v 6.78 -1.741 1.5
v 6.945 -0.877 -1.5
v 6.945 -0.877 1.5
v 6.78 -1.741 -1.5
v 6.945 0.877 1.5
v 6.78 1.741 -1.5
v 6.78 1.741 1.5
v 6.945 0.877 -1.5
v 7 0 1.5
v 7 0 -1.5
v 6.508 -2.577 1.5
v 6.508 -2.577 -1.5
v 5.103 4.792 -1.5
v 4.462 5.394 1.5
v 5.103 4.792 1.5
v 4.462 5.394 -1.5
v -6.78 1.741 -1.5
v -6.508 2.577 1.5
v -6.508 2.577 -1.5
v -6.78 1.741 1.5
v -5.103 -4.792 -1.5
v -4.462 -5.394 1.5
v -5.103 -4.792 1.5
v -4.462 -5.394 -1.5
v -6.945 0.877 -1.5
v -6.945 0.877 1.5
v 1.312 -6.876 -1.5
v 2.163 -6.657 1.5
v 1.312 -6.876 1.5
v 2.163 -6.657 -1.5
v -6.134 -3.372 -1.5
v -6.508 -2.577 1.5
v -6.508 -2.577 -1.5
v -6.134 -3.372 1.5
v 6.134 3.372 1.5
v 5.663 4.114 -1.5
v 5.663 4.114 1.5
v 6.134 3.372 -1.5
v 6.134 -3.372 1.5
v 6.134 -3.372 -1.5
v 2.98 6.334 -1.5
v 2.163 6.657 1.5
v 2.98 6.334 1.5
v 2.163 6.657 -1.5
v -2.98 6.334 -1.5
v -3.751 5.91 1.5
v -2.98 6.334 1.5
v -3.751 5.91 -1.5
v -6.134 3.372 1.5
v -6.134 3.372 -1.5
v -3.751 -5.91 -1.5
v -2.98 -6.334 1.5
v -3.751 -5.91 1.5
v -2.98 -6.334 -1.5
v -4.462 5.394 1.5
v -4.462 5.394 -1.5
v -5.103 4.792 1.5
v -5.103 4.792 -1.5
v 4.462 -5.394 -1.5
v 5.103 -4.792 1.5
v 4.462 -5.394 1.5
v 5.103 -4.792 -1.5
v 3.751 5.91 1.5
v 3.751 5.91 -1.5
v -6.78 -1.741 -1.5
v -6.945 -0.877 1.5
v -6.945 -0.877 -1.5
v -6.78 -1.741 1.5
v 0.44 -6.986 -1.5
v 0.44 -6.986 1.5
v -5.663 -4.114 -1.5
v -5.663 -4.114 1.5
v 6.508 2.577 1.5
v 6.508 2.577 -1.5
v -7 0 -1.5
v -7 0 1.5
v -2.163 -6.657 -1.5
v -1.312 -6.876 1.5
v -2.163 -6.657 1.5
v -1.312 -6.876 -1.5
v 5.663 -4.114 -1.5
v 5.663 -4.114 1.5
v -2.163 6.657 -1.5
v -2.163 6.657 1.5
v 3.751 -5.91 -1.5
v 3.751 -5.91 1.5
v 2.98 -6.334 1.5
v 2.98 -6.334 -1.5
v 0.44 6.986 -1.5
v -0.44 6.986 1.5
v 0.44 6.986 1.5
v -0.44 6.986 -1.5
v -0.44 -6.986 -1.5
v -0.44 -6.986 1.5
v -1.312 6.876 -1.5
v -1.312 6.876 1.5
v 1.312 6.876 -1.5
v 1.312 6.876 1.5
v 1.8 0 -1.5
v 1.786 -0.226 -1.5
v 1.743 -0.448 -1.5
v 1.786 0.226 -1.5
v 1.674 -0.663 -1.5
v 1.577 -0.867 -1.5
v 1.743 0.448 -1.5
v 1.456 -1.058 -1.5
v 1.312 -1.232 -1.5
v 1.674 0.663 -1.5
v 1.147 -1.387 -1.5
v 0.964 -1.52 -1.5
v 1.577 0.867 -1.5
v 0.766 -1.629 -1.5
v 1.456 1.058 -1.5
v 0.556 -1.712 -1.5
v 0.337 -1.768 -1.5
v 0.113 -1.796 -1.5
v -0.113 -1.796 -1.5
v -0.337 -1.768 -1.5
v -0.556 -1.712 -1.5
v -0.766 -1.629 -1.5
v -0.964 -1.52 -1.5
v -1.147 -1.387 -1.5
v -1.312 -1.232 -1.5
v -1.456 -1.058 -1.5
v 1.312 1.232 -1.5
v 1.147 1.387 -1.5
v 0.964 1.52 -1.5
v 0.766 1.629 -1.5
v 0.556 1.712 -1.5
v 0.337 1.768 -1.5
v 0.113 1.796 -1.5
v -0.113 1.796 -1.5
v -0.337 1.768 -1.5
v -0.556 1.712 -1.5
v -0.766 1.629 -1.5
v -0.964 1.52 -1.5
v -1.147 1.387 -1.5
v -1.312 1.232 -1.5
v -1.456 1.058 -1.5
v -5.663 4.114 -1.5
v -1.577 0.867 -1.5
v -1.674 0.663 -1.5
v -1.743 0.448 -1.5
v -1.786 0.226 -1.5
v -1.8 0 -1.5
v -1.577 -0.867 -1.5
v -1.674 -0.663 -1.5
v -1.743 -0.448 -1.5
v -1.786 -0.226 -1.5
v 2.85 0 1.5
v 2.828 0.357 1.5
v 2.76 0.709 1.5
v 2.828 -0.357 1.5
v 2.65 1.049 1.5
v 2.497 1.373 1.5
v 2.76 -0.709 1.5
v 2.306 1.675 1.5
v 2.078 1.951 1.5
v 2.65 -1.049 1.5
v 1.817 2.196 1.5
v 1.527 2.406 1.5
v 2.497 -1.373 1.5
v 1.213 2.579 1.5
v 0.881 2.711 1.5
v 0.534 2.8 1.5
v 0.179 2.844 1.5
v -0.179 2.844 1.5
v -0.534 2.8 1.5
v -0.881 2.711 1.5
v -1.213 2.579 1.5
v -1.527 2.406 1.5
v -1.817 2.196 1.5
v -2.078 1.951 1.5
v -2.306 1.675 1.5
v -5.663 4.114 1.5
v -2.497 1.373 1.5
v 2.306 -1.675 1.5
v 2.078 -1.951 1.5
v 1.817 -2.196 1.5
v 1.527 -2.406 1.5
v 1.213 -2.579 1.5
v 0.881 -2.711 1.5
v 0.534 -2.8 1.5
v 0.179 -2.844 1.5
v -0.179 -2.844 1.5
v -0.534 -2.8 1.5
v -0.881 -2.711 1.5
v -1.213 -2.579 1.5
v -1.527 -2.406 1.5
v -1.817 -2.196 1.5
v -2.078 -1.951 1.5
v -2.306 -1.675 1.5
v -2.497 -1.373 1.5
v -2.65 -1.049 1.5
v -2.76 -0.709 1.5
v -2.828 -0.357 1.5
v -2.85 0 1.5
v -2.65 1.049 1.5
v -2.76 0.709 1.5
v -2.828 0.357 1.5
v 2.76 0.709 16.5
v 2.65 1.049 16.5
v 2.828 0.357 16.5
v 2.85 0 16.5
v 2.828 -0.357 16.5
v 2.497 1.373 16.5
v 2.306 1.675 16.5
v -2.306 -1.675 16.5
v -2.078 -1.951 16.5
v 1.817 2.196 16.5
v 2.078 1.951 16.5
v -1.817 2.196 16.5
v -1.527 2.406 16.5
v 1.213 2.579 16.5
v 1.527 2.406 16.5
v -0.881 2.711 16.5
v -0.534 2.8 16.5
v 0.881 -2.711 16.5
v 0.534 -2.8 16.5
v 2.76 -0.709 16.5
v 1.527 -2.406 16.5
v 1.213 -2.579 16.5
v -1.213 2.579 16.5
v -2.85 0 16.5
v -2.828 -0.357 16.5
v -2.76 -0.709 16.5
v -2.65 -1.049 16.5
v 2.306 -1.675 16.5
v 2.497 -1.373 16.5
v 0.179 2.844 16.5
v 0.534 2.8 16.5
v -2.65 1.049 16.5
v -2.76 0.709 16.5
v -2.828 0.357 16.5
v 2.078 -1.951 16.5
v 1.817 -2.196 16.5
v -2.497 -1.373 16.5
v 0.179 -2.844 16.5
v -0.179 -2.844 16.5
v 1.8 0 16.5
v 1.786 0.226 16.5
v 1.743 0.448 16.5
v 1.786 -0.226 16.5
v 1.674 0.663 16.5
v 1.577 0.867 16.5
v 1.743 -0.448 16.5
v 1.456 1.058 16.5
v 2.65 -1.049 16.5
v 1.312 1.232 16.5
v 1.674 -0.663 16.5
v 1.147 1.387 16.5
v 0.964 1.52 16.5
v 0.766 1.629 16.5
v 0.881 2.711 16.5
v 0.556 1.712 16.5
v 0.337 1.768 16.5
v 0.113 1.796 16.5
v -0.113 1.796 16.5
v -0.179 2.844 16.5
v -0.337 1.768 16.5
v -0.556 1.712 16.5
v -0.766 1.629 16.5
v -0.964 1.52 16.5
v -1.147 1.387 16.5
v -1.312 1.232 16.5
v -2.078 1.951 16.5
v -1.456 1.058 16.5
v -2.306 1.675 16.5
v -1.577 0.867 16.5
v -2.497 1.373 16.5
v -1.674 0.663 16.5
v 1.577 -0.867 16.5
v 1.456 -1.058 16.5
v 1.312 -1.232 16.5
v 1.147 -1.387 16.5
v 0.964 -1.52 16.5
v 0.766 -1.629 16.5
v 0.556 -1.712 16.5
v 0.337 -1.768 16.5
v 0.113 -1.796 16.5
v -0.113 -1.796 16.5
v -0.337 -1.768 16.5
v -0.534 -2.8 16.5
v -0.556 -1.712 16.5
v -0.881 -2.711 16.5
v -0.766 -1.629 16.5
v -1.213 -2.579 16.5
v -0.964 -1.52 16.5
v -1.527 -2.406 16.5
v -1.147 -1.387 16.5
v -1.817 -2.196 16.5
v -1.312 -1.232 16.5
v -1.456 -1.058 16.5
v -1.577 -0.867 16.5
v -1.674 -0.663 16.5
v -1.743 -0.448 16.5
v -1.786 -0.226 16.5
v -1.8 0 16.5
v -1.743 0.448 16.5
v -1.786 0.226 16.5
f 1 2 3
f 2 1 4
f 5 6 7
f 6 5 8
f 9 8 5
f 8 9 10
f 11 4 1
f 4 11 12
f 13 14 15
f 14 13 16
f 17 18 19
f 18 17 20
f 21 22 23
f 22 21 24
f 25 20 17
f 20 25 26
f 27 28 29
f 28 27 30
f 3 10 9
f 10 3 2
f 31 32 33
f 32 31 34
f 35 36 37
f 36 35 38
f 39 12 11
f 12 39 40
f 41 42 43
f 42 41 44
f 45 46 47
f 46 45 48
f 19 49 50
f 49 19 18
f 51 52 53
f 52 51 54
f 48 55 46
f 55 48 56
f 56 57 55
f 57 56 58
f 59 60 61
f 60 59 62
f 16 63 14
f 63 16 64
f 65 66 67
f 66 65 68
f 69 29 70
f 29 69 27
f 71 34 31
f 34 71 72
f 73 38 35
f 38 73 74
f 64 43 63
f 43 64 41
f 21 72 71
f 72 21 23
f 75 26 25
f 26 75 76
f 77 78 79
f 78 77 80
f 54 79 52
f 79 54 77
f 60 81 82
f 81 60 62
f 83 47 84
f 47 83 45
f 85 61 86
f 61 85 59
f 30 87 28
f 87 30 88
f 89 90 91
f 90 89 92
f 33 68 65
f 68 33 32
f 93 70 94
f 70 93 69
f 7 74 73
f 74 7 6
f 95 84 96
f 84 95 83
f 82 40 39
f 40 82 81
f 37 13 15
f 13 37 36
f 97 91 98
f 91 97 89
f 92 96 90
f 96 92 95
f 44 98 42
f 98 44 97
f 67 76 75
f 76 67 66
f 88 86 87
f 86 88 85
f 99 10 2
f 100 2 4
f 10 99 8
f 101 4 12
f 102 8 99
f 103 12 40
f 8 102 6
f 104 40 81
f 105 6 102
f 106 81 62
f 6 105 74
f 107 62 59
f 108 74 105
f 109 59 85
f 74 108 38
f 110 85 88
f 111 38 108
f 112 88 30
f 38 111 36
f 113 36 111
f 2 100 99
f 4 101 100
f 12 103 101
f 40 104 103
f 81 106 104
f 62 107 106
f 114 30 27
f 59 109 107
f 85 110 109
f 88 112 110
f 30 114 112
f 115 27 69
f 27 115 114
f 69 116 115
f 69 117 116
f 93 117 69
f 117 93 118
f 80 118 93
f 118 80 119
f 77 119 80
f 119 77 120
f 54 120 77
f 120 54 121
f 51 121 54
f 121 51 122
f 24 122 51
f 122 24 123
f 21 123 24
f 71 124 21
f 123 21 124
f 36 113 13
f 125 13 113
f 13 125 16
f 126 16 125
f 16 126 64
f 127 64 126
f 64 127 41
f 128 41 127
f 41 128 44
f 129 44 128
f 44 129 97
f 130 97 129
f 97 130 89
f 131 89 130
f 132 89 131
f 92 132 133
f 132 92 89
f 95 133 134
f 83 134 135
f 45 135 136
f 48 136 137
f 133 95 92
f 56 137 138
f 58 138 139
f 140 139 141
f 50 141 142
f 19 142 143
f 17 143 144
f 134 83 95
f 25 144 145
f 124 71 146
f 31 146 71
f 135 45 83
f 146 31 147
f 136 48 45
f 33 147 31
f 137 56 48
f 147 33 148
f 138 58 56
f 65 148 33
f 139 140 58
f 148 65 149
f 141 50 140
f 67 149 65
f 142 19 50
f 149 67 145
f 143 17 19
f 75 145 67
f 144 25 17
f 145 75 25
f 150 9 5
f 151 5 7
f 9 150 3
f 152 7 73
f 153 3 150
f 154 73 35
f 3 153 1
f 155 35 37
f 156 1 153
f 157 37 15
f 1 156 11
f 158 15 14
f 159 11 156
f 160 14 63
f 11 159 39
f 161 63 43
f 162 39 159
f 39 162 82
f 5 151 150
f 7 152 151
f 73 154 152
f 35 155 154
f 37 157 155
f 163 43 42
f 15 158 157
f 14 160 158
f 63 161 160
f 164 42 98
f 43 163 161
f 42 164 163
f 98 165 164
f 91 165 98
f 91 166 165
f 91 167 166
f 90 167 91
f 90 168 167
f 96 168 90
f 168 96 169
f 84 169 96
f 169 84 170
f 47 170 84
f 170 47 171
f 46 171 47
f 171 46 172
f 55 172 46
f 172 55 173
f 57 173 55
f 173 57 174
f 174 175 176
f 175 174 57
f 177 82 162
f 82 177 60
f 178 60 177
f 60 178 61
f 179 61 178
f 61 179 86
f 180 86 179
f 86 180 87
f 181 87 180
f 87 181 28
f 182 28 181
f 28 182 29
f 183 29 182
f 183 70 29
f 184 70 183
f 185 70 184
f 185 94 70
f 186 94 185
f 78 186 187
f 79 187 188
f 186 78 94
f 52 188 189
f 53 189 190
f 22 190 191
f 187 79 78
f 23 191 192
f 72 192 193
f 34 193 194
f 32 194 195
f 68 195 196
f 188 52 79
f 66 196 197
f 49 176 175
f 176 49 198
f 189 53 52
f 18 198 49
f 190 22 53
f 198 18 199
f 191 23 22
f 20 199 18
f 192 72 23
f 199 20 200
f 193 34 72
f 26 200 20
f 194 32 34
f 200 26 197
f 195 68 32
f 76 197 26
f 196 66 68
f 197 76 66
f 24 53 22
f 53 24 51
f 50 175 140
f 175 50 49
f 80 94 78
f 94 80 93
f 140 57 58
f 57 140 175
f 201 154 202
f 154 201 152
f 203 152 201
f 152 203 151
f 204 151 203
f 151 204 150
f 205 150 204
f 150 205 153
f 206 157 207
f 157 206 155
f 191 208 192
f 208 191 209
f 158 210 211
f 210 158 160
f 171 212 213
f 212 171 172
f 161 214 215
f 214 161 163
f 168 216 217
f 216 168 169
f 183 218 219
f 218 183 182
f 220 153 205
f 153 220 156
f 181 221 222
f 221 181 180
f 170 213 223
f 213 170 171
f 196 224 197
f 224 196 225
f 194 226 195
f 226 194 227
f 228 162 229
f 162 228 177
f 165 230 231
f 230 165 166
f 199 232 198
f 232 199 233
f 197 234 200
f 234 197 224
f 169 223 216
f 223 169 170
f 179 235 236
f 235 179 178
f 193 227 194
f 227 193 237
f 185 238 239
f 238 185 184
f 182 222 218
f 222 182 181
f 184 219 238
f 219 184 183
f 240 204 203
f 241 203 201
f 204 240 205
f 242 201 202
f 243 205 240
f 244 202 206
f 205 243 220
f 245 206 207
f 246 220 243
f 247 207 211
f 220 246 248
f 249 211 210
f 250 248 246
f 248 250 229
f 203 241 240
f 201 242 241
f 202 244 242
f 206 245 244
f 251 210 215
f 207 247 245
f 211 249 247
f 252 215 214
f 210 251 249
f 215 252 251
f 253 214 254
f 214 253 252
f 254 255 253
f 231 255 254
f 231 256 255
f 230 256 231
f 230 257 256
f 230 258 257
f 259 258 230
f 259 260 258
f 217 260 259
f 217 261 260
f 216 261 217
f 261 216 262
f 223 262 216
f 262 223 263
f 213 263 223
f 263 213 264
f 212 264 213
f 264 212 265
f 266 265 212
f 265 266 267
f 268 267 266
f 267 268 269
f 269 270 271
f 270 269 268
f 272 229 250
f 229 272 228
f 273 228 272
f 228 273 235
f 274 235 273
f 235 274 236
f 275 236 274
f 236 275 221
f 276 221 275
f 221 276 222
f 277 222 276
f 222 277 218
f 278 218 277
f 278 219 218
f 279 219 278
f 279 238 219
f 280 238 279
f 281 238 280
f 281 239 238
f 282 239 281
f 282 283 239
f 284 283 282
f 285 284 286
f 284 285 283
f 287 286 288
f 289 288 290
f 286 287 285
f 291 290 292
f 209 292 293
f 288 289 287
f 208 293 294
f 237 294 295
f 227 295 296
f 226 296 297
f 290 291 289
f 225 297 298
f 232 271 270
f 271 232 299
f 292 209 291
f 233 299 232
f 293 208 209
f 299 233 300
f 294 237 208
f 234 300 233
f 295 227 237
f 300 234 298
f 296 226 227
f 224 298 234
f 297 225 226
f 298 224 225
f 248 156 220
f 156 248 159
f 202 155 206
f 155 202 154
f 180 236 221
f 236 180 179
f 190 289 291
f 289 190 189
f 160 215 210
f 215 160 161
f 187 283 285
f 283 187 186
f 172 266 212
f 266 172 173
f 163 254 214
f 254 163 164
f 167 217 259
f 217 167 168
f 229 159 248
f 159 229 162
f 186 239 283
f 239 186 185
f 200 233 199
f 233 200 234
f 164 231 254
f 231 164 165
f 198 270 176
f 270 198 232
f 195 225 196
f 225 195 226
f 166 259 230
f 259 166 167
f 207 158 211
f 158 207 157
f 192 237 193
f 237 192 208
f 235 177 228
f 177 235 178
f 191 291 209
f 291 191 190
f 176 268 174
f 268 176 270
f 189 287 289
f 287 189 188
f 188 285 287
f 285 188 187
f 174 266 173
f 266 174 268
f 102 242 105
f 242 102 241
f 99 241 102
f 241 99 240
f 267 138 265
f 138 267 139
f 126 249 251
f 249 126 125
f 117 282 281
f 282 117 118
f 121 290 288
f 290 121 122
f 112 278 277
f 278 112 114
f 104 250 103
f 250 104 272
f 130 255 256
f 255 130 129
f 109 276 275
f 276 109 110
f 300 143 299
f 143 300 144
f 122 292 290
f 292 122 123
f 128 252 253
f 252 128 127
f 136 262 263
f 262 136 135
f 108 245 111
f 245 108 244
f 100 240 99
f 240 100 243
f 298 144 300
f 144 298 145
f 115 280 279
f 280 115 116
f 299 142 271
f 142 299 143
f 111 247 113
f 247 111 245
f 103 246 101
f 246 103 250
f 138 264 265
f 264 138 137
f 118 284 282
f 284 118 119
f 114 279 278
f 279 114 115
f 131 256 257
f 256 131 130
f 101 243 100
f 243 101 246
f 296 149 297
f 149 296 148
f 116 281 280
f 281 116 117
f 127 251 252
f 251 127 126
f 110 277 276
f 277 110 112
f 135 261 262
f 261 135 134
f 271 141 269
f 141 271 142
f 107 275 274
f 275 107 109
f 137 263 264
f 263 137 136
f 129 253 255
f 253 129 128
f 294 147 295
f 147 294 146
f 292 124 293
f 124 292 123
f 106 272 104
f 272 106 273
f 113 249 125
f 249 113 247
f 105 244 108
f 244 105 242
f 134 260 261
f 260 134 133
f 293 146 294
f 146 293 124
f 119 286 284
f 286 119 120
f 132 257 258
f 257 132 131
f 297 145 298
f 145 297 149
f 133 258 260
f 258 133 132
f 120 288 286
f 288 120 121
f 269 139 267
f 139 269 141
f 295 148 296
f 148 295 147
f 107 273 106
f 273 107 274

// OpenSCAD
$fn = 50;


difference() {
	union() {
		translate(v = [0, 0, -1.5000000000]) {
			cylinder(h = 3, r = 7.0000000000);
		}
		translate(v = [0, 0, -1.5000000000]) {
			cylinder(h = 18, r = 2.8500000000);
		}
	}
	union() {
		translate(v = [0, 0, -100.0000000000]) {
			cylinder(h = 200, r = 1.8000000000);
		}
	}
}
